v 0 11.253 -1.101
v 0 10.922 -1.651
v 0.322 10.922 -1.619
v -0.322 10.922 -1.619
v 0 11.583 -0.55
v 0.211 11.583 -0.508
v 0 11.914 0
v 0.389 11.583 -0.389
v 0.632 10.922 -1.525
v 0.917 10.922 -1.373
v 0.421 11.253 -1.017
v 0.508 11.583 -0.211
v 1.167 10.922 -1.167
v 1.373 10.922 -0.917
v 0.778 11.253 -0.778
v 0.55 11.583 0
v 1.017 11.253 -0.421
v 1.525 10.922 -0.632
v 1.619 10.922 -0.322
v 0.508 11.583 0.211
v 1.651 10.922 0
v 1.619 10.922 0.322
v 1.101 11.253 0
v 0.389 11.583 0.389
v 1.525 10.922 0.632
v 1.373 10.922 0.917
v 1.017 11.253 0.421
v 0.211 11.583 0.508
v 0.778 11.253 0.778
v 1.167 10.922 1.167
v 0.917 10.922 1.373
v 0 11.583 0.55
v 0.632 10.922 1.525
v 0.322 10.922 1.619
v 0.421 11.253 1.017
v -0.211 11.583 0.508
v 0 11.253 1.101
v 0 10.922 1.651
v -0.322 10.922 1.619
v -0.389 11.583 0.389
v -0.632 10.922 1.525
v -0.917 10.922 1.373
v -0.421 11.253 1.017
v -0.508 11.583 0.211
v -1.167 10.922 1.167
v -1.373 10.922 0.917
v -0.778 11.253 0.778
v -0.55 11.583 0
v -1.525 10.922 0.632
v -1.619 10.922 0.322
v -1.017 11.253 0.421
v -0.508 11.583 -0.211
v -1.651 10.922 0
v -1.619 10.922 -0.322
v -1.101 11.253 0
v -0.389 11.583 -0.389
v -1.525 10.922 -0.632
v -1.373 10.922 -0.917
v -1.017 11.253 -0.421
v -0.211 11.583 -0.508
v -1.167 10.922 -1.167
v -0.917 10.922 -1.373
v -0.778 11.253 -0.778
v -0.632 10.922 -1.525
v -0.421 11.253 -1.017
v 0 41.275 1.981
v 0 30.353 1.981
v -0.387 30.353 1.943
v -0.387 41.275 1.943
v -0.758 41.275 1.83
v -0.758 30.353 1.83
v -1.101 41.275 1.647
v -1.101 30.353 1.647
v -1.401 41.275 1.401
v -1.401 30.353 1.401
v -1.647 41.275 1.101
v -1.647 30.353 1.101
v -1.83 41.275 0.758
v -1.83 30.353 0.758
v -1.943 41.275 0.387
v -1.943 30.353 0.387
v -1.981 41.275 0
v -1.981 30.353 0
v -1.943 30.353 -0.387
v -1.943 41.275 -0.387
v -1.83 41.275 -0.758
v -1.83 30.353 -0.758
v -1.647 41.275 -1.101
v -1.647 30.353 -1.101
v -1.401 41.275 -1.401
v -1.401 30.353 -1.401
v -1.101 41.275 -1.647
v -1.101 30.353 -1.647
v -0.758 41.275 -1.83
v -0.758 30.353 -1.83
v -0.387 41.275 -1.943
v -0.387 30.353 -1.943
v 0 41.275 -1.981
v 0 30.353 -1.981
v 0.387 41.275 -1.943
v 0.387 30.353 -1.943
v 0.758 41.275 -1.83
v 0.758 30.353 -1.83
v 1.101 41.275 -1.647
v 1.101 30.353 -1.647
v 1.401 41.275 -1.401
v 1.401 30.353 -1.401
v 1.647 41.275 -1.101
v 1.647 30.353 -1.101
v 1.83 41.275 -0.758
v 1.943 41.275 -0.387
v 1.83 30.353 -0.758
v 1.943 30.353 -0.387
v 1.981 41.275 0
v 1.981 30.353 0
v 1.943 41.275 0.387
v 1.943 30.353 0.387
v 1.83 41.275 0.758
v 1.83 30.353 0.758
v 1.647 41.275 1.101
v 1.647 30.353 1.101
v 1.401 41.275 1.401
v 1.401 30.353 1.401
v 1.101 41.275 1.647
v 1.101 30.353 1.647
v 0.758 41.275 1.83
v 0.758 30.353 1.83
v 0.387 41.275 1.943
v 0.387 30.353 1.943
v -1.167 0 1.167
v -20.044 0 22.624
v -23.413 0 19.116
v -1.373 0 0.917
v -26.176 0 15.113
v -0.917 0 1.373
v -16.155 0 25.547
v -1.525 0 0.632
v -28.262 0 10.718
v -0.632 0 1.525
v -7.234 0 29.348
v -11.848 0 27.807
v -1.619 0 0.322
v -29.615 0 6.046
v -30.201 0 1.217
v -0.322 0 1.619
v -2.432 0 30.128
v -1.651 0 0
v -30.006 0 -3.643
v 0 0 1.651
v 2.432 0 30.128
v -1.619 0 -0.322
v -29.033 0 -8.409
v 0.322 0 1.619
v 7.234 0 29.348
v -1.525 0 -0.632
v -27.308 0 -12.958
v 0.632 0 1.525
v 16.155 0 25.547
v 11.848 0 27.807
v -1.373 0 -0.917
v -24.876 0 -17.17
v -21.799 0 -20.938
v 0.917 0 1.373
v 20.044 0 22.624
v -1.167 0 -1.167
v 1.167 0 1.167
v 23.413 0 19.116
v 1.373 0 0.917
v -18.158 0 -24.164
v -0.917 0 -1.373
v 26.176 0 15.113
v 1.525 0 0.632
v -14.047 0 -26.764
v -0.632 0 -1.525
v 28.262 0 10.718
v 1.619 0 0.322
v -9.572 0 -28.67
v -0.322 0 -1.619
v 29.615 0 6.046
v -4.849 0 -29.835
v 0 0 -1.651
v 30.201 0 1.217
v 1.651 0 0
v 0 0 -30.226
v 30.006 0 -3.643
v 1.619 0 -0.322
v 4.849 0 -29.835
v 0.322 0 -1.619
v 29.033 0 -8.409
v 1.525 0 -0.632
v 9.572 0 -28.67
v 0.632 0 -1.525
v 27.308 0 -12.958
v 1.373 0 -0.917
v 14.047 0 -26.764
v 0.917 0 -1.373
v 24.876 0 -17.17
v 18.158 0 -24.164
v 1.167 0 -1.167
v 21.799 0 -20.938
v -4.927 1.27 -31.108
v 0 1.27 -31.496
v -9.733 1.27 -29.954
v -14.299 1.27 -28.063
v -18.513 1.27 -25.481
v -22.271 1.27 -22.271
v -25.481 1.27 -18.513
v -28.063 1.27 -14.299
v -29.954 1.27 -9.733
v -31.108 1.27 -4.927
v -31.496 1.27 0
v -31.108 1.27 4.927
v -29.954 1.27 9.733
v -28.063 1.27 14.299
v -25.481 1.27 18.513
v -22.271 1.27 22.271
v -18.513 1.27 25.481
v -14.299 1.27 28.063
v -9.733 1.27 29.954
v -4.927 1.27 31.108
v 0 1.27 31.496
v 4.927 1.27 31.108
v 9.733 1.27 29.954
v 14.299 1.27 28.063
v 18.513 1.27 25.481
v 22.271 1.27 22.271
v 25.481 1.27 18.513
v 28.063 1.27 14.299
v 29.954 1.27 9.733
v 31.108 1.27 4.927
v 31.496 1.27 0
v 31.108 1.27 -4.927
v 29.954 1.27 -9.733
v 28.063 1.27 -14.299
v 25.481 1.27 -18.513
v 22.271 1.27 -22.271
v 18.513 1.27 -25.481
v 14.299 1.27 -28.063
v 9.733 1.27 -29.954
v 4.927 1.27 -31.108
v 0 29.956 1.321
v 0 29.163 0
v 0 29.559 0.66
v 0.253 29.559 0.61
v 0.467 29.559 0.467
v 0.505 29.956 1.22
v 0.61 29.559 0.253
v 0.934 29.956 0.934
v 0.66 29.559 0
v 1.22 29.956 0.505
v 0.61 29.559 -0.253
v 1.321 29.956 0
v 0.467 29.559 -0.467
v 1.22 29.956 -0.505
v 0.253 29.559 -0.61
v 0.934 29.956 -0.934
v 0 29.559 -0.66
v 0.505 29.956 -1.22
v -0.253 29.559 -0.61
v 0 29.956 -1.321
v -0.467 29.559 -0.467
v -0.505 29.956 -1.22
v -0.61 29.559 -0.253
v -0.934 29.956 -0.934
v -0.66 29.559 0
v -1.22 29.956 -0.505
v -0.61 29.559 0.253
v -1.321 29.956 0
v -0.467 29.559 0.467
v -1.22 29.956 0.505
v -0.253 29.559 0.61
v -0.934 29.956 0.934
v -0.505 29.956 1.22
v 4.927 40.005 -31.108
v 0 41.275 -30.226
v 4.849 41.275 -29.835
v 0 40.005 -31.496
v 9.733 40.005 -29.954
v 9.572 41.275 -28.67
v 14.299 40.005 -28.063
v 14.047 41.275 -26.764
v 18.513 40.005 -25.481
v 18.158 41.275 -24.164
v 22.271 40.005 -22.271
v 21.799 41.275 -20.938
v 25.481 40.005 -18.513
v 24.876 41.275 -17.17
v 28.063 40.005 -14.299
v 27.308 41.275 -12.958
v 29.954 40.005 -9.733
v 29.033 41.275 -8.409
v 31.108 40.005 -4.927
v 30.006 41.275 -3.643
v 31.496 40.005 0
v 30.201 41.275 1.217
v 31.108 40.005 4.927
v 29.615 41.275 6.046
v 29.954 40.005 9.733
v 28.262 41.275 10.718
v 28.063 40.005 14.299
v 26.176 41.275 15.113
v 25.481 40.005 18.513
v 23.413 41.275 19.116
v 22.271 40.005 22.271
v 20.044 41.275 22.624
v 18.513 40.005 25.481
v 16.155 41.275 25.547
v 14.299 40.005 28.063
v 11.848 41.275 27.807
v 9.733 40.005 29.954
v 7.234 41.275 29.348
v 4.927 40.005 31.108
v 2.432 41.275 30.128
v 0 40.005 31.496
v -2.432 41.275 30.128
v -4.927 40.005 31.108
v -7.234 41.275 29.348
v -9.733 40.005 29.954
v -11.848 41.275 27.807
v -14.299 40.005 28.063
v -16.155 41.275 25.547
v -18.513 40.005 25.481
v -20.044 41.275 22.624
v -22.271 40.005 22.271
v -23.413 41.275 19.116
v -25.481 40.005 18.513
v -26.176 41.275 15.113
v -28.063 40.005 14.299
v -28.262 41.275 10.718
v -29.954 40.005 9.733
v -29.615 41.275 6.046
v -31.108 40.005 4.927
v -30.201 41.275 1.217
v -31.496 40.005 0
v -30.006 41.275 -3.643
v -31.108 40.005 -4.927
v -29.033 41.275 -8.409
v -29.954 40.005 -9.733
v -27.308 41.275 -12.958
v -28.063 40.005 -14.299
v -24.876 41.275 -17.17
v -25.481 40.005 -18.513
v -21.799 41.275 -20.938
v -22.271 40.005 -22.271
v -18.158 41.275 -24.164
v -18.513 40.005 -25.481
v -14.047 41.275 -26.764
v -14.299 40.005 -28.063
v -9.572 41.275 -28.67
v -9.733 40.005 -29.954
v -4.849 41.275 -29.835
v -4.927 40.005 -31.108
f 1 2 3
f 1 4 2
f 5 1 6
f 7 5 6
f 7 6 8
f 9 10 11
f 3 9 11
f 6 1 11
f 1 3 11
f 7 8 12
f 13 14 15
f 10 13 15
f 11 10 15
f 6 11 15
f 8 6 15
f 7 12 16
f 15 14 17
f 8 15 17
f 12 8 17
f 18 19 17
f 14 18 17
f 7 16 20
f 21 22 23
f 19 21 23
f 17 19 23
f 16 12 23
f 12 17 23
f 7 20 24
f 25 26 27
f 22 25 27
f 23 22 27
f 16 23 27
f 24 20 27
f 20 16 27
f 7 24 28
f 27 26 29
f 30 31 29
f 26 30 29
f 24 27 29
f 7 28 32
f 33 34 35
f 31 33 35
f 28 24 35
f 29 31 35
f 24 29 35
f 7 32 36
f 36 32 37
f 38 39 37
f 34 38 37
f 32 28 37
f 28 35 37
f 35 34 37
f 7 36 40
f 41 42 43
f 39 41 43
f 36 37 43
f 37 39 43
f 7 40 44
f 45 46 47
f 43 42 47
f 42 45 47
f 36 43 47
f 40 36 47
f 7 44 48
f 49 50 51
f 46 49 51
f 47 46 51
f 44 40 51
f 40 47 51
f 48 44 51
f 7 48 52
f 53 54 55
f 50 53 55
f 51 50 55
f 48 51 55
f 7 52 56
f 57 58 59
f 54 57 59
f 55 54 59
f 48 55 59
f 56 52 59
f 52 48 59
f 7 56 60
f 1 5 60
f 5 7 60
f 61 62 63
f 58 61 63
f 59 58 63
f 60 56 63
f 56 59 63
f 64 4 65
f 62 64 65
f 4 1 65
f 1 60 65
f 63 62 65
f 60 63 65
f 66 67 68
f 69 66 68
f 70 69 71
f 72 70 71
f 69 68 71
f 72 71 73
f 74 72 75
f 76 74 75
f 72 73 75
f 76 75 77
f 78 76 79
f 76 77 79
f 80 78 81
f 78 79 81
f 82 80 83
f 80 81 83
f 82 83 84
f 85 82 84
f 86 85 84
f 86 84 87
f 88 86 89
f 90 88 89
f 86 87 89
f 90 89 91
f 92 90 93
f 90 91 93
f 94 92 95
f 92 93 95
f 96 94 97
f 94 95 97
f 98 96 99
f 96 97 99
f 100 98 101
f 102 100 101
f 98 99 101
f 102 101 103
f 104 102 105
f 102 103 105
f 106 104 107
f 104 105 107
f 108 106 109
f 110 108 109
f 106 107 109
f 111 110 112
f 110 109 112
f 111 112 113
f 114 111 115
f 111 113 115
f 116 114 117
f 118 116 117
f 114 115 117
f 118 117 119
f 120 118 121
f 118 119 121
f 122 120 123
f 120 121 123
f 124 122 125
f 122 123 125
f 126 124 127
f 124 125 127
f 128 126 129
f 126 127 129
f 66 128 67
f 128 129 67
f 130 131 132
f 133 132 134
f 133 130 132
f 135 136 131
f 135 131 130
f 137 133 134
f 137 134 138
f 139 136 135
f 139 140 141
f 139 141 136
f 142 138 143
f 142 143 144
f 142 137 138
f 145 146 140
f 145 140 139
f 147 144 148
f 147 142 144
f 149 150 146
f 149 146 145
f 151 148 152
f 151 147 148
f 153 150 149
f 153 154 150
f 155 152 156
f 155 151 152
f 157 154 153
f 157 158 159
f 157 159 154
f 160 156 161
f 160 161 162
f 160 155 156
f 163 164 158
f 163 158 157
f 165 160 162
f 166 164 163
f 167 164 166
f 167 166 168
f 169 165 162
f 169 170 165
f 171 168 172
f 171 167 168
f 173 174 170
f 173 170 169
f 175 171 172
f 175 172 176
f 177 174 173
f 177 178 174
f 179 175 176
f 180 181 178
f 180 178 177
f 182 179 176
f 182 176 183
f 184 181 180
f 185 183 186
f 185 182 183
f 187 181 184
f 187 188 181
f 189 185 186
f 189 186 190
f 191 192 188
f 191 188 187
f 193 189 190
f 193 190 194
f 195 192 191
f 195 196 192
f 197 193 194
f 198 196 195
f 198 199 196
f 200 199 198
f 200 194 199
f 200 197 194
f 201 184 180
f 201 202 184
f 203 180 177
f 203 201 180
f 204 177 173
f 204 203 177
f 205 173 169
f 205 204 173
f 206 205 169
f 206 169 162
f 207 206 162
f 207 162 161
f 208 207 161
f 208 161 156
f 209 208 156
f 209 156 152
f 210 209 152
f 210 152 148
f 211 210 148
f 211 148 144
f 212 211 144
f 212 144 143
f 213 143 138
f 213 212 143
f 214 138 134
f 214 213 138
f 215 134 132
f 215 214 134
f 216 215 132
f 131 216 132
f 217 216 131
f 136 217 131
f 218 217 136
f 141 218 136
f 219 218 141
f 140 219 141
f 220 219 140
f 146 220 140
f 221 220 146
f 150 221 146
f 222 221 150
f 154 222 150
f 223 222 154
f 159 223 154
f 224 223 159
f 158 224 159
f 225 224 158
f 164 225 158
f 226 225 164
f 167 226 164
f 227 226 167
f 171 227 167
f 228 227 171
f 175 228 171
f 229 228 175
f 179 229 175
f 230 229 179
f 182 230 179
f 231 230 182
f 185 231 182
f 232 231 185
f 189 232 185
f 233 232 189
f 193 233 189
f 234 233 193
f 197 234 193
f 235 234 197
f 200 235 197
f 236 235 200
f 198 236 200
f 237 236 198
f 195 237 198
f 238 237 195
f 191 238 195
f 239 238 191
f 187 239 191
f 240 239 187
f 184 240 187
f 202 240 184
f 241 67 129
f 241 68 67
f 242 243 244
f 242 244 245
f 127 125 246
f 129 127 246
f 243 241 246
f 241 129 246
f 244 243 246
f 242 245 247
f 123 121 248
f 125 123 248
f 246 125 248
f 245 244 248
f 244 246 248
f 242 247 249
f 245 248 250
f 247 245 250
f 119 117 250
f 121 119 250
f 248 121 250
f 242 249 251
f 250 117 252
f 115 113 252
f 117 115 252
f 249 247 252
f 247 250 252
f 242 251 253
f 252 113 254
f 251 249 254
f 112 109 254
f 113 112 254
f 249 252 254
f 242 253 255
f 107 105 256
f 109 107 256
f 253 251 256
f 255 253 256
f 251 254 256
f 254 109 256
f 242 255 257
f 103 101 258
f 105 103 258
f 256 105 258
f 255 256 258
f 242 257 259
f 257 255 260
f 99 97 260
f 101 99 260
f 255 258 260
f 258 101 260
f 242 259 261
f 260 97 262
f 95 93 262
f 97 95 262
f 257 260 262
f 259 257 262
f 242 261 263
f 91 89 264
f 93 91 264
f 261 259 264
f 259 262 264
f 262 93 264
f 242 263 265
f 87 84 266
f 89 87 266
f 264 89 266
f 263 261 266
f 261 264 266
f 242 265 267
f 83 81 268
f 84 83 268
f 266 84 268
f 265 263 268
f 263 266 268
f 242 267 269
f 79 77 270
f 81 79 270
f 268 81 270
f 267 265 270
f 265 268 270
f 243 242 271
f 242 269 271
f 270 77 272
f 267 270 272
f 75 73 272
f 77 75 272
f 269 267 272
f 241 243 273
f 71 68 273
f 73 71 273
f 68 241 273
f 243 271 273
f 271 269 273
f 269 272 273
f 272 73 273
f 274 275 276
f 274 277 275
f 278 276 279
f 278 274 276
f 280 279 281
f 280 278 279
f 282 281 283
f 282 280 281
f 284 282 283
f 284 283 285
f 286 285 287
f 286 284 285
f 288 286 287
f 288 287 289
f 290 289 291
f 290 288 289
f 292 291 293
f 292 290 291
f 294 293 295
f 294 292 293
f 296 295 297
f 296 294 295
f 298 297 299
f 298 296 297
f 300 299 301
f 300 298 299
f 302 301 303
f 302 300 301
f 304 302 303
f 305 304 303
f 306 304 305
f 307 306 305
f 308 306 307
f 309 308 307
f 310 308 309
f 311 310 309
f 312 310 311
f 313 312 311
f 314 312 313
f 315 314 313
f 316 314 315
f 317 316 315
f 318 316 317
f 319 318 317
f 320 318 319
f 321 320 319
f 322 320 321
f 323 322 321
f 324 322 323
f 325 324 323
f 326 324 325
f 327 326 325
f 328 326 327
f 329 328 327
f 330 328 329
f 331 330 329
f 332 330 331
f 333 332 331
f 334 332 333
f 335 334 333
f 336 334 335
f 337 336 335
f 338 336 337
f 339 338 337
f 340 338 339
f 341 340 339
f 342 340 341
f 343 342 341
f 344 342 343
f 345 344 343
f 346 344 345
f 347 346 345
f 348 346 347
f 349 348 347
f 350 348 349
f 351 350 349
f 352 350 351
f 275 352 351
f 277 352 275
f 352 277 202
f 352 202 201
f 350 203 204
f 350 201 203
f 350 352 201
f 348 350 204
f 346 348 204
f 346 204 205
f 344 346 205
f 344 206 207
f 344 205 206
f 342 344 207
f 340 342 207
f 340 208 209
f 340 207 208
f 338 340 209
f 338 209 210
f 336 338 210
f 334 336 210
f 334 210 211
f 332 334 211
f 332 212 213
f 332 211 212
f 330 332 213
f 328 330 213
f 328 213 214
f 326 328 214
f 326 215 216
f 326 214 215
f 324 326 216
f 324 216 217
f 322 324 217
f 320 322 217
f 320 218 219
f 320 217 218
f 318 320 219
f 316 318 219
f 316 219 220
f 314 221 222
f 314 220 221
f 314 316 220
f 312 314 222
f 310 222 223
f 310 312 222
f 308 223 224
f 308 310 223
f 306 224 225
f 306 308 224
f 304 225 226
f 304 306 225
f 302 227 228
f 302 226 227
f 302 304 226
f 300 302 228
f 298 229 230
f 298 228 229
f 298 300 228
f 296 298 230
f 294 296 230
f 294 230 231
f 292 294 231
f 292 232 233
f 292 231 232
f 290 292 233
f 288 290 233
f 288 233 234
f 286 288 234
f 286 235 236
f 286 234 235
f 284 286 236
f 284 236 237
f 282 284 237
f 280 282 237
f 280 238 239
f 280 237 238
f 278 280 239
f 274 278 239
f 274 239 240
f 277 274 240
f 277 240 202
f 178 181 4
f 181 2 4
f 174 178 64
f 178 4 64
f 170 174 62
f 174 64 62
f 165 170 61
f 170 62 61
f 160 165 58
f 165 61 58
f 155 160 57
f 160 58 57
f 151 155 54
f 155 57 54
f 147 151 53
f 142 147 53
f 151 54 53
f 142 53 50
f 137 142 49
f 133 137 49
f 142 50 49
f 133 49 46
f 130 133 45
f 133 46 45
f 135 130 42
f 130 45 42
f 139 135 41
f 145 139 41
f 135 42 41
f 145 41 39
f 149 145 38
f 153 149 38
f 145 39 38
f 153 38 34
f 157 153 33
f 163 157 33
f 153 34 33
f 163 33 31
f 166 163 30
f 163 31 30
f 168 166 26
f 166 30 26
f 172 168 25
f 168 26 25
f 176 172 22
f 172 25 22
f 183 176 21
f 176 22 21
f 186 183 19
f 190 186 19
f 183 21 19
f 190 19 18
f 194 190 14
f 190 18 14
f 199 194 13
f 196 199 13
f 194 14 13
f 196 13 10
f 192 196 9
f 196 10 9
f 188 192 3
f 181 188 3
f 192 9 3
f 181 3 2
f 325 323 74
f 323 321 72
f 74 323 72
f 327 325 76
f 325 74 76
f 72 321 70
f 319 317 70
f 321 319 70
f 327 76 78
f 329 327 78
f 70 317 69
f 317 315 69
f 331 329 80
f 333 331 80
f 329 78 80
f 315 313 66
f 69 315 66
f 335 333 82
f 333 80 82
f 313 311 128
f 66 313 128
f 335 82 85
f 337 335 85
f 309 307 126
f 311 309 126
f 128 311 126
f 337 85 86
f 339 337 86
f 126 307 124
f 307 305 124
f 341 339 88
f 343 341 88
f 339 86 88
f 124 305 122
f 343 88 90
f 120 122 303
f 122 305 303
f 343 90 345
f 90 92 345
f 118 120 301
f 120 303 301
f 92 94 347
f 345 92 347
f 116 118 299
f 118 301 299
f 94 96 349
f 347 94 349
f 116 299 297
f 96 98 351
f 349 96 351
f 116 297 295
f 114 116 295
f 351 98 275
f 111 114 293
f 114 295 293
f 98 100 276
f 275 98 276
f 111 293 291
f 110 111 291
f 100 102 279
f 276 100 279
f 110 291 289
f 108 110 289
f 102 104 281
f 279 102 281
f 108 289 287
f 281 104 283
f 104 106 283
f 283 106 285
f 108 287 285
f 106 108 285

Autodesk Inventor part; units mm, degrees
ref_plane "YZ Plane" through (0, 0, 0) normal (1, 0, 0) x (0, 1, 0)
ref_plane "XZ Plane" through (0, 0, 0) normal (0, 1, 0) x (-1, 0, 0)
ref_plane "XY Plane" through (0, 0, 0) normal (0, 0, 1) x (1, 0, 0)
sketch "Sketch2" plane through (0, 0, 0) normal (1, 0, 0) x (0, 1, 0)
  line L0 (0, 0) -> (0, -31.496)
  line L1 (0, -31.496) -> (41.275, -31.496)
  line L2 (41.275, -31.496) -> (41.275, 0)
  line L3 (41.275, 0) -> (0, 0)
  dimension "d0" = 41.275
  dimension "d2" = 31.496
revolve "Revolution1" add sketch "Sketch2" angle 360 about axis through (0, 41.275, 0) along (0, -1, 0)
chamfer "Chamfer1" distance 1.27 angle 45 2 edges at (0, 41.275, 31.496) (0, 0, 31.496)
sketch "Sketch4" plane through (0, 0, 0) normal (0, -1, 0) x (1, 0, 0)
  circle A0 centre (0, 0) radius 3.175 projected
  point P0 (0, 0)
hole "Hole2" at (0, 0, 0) direction (0, 1, 0) diameter 3.302 depth 10.922 tip angle 118 thread size "8-32 UNC" class "2B" standard "ANSI Unified Screw Threads"
sketch "Sketch5" plane through (0, 41.275, 0) normal (0, 1, 0) x (1, 0, 0)
  circle A0 centre (0, 0) radius 1.651 projected
  point P0 (0, 0)
hole "Hole3" at (0, 41.275, 0) direction (0, -1, 0) diameter 3.9624 depth 10.922 tip angle 118 thread size "10-32 UNF" class "2B" standard "ANSI Unified Screw Threads"
properties part number "Fixture_Weight"
